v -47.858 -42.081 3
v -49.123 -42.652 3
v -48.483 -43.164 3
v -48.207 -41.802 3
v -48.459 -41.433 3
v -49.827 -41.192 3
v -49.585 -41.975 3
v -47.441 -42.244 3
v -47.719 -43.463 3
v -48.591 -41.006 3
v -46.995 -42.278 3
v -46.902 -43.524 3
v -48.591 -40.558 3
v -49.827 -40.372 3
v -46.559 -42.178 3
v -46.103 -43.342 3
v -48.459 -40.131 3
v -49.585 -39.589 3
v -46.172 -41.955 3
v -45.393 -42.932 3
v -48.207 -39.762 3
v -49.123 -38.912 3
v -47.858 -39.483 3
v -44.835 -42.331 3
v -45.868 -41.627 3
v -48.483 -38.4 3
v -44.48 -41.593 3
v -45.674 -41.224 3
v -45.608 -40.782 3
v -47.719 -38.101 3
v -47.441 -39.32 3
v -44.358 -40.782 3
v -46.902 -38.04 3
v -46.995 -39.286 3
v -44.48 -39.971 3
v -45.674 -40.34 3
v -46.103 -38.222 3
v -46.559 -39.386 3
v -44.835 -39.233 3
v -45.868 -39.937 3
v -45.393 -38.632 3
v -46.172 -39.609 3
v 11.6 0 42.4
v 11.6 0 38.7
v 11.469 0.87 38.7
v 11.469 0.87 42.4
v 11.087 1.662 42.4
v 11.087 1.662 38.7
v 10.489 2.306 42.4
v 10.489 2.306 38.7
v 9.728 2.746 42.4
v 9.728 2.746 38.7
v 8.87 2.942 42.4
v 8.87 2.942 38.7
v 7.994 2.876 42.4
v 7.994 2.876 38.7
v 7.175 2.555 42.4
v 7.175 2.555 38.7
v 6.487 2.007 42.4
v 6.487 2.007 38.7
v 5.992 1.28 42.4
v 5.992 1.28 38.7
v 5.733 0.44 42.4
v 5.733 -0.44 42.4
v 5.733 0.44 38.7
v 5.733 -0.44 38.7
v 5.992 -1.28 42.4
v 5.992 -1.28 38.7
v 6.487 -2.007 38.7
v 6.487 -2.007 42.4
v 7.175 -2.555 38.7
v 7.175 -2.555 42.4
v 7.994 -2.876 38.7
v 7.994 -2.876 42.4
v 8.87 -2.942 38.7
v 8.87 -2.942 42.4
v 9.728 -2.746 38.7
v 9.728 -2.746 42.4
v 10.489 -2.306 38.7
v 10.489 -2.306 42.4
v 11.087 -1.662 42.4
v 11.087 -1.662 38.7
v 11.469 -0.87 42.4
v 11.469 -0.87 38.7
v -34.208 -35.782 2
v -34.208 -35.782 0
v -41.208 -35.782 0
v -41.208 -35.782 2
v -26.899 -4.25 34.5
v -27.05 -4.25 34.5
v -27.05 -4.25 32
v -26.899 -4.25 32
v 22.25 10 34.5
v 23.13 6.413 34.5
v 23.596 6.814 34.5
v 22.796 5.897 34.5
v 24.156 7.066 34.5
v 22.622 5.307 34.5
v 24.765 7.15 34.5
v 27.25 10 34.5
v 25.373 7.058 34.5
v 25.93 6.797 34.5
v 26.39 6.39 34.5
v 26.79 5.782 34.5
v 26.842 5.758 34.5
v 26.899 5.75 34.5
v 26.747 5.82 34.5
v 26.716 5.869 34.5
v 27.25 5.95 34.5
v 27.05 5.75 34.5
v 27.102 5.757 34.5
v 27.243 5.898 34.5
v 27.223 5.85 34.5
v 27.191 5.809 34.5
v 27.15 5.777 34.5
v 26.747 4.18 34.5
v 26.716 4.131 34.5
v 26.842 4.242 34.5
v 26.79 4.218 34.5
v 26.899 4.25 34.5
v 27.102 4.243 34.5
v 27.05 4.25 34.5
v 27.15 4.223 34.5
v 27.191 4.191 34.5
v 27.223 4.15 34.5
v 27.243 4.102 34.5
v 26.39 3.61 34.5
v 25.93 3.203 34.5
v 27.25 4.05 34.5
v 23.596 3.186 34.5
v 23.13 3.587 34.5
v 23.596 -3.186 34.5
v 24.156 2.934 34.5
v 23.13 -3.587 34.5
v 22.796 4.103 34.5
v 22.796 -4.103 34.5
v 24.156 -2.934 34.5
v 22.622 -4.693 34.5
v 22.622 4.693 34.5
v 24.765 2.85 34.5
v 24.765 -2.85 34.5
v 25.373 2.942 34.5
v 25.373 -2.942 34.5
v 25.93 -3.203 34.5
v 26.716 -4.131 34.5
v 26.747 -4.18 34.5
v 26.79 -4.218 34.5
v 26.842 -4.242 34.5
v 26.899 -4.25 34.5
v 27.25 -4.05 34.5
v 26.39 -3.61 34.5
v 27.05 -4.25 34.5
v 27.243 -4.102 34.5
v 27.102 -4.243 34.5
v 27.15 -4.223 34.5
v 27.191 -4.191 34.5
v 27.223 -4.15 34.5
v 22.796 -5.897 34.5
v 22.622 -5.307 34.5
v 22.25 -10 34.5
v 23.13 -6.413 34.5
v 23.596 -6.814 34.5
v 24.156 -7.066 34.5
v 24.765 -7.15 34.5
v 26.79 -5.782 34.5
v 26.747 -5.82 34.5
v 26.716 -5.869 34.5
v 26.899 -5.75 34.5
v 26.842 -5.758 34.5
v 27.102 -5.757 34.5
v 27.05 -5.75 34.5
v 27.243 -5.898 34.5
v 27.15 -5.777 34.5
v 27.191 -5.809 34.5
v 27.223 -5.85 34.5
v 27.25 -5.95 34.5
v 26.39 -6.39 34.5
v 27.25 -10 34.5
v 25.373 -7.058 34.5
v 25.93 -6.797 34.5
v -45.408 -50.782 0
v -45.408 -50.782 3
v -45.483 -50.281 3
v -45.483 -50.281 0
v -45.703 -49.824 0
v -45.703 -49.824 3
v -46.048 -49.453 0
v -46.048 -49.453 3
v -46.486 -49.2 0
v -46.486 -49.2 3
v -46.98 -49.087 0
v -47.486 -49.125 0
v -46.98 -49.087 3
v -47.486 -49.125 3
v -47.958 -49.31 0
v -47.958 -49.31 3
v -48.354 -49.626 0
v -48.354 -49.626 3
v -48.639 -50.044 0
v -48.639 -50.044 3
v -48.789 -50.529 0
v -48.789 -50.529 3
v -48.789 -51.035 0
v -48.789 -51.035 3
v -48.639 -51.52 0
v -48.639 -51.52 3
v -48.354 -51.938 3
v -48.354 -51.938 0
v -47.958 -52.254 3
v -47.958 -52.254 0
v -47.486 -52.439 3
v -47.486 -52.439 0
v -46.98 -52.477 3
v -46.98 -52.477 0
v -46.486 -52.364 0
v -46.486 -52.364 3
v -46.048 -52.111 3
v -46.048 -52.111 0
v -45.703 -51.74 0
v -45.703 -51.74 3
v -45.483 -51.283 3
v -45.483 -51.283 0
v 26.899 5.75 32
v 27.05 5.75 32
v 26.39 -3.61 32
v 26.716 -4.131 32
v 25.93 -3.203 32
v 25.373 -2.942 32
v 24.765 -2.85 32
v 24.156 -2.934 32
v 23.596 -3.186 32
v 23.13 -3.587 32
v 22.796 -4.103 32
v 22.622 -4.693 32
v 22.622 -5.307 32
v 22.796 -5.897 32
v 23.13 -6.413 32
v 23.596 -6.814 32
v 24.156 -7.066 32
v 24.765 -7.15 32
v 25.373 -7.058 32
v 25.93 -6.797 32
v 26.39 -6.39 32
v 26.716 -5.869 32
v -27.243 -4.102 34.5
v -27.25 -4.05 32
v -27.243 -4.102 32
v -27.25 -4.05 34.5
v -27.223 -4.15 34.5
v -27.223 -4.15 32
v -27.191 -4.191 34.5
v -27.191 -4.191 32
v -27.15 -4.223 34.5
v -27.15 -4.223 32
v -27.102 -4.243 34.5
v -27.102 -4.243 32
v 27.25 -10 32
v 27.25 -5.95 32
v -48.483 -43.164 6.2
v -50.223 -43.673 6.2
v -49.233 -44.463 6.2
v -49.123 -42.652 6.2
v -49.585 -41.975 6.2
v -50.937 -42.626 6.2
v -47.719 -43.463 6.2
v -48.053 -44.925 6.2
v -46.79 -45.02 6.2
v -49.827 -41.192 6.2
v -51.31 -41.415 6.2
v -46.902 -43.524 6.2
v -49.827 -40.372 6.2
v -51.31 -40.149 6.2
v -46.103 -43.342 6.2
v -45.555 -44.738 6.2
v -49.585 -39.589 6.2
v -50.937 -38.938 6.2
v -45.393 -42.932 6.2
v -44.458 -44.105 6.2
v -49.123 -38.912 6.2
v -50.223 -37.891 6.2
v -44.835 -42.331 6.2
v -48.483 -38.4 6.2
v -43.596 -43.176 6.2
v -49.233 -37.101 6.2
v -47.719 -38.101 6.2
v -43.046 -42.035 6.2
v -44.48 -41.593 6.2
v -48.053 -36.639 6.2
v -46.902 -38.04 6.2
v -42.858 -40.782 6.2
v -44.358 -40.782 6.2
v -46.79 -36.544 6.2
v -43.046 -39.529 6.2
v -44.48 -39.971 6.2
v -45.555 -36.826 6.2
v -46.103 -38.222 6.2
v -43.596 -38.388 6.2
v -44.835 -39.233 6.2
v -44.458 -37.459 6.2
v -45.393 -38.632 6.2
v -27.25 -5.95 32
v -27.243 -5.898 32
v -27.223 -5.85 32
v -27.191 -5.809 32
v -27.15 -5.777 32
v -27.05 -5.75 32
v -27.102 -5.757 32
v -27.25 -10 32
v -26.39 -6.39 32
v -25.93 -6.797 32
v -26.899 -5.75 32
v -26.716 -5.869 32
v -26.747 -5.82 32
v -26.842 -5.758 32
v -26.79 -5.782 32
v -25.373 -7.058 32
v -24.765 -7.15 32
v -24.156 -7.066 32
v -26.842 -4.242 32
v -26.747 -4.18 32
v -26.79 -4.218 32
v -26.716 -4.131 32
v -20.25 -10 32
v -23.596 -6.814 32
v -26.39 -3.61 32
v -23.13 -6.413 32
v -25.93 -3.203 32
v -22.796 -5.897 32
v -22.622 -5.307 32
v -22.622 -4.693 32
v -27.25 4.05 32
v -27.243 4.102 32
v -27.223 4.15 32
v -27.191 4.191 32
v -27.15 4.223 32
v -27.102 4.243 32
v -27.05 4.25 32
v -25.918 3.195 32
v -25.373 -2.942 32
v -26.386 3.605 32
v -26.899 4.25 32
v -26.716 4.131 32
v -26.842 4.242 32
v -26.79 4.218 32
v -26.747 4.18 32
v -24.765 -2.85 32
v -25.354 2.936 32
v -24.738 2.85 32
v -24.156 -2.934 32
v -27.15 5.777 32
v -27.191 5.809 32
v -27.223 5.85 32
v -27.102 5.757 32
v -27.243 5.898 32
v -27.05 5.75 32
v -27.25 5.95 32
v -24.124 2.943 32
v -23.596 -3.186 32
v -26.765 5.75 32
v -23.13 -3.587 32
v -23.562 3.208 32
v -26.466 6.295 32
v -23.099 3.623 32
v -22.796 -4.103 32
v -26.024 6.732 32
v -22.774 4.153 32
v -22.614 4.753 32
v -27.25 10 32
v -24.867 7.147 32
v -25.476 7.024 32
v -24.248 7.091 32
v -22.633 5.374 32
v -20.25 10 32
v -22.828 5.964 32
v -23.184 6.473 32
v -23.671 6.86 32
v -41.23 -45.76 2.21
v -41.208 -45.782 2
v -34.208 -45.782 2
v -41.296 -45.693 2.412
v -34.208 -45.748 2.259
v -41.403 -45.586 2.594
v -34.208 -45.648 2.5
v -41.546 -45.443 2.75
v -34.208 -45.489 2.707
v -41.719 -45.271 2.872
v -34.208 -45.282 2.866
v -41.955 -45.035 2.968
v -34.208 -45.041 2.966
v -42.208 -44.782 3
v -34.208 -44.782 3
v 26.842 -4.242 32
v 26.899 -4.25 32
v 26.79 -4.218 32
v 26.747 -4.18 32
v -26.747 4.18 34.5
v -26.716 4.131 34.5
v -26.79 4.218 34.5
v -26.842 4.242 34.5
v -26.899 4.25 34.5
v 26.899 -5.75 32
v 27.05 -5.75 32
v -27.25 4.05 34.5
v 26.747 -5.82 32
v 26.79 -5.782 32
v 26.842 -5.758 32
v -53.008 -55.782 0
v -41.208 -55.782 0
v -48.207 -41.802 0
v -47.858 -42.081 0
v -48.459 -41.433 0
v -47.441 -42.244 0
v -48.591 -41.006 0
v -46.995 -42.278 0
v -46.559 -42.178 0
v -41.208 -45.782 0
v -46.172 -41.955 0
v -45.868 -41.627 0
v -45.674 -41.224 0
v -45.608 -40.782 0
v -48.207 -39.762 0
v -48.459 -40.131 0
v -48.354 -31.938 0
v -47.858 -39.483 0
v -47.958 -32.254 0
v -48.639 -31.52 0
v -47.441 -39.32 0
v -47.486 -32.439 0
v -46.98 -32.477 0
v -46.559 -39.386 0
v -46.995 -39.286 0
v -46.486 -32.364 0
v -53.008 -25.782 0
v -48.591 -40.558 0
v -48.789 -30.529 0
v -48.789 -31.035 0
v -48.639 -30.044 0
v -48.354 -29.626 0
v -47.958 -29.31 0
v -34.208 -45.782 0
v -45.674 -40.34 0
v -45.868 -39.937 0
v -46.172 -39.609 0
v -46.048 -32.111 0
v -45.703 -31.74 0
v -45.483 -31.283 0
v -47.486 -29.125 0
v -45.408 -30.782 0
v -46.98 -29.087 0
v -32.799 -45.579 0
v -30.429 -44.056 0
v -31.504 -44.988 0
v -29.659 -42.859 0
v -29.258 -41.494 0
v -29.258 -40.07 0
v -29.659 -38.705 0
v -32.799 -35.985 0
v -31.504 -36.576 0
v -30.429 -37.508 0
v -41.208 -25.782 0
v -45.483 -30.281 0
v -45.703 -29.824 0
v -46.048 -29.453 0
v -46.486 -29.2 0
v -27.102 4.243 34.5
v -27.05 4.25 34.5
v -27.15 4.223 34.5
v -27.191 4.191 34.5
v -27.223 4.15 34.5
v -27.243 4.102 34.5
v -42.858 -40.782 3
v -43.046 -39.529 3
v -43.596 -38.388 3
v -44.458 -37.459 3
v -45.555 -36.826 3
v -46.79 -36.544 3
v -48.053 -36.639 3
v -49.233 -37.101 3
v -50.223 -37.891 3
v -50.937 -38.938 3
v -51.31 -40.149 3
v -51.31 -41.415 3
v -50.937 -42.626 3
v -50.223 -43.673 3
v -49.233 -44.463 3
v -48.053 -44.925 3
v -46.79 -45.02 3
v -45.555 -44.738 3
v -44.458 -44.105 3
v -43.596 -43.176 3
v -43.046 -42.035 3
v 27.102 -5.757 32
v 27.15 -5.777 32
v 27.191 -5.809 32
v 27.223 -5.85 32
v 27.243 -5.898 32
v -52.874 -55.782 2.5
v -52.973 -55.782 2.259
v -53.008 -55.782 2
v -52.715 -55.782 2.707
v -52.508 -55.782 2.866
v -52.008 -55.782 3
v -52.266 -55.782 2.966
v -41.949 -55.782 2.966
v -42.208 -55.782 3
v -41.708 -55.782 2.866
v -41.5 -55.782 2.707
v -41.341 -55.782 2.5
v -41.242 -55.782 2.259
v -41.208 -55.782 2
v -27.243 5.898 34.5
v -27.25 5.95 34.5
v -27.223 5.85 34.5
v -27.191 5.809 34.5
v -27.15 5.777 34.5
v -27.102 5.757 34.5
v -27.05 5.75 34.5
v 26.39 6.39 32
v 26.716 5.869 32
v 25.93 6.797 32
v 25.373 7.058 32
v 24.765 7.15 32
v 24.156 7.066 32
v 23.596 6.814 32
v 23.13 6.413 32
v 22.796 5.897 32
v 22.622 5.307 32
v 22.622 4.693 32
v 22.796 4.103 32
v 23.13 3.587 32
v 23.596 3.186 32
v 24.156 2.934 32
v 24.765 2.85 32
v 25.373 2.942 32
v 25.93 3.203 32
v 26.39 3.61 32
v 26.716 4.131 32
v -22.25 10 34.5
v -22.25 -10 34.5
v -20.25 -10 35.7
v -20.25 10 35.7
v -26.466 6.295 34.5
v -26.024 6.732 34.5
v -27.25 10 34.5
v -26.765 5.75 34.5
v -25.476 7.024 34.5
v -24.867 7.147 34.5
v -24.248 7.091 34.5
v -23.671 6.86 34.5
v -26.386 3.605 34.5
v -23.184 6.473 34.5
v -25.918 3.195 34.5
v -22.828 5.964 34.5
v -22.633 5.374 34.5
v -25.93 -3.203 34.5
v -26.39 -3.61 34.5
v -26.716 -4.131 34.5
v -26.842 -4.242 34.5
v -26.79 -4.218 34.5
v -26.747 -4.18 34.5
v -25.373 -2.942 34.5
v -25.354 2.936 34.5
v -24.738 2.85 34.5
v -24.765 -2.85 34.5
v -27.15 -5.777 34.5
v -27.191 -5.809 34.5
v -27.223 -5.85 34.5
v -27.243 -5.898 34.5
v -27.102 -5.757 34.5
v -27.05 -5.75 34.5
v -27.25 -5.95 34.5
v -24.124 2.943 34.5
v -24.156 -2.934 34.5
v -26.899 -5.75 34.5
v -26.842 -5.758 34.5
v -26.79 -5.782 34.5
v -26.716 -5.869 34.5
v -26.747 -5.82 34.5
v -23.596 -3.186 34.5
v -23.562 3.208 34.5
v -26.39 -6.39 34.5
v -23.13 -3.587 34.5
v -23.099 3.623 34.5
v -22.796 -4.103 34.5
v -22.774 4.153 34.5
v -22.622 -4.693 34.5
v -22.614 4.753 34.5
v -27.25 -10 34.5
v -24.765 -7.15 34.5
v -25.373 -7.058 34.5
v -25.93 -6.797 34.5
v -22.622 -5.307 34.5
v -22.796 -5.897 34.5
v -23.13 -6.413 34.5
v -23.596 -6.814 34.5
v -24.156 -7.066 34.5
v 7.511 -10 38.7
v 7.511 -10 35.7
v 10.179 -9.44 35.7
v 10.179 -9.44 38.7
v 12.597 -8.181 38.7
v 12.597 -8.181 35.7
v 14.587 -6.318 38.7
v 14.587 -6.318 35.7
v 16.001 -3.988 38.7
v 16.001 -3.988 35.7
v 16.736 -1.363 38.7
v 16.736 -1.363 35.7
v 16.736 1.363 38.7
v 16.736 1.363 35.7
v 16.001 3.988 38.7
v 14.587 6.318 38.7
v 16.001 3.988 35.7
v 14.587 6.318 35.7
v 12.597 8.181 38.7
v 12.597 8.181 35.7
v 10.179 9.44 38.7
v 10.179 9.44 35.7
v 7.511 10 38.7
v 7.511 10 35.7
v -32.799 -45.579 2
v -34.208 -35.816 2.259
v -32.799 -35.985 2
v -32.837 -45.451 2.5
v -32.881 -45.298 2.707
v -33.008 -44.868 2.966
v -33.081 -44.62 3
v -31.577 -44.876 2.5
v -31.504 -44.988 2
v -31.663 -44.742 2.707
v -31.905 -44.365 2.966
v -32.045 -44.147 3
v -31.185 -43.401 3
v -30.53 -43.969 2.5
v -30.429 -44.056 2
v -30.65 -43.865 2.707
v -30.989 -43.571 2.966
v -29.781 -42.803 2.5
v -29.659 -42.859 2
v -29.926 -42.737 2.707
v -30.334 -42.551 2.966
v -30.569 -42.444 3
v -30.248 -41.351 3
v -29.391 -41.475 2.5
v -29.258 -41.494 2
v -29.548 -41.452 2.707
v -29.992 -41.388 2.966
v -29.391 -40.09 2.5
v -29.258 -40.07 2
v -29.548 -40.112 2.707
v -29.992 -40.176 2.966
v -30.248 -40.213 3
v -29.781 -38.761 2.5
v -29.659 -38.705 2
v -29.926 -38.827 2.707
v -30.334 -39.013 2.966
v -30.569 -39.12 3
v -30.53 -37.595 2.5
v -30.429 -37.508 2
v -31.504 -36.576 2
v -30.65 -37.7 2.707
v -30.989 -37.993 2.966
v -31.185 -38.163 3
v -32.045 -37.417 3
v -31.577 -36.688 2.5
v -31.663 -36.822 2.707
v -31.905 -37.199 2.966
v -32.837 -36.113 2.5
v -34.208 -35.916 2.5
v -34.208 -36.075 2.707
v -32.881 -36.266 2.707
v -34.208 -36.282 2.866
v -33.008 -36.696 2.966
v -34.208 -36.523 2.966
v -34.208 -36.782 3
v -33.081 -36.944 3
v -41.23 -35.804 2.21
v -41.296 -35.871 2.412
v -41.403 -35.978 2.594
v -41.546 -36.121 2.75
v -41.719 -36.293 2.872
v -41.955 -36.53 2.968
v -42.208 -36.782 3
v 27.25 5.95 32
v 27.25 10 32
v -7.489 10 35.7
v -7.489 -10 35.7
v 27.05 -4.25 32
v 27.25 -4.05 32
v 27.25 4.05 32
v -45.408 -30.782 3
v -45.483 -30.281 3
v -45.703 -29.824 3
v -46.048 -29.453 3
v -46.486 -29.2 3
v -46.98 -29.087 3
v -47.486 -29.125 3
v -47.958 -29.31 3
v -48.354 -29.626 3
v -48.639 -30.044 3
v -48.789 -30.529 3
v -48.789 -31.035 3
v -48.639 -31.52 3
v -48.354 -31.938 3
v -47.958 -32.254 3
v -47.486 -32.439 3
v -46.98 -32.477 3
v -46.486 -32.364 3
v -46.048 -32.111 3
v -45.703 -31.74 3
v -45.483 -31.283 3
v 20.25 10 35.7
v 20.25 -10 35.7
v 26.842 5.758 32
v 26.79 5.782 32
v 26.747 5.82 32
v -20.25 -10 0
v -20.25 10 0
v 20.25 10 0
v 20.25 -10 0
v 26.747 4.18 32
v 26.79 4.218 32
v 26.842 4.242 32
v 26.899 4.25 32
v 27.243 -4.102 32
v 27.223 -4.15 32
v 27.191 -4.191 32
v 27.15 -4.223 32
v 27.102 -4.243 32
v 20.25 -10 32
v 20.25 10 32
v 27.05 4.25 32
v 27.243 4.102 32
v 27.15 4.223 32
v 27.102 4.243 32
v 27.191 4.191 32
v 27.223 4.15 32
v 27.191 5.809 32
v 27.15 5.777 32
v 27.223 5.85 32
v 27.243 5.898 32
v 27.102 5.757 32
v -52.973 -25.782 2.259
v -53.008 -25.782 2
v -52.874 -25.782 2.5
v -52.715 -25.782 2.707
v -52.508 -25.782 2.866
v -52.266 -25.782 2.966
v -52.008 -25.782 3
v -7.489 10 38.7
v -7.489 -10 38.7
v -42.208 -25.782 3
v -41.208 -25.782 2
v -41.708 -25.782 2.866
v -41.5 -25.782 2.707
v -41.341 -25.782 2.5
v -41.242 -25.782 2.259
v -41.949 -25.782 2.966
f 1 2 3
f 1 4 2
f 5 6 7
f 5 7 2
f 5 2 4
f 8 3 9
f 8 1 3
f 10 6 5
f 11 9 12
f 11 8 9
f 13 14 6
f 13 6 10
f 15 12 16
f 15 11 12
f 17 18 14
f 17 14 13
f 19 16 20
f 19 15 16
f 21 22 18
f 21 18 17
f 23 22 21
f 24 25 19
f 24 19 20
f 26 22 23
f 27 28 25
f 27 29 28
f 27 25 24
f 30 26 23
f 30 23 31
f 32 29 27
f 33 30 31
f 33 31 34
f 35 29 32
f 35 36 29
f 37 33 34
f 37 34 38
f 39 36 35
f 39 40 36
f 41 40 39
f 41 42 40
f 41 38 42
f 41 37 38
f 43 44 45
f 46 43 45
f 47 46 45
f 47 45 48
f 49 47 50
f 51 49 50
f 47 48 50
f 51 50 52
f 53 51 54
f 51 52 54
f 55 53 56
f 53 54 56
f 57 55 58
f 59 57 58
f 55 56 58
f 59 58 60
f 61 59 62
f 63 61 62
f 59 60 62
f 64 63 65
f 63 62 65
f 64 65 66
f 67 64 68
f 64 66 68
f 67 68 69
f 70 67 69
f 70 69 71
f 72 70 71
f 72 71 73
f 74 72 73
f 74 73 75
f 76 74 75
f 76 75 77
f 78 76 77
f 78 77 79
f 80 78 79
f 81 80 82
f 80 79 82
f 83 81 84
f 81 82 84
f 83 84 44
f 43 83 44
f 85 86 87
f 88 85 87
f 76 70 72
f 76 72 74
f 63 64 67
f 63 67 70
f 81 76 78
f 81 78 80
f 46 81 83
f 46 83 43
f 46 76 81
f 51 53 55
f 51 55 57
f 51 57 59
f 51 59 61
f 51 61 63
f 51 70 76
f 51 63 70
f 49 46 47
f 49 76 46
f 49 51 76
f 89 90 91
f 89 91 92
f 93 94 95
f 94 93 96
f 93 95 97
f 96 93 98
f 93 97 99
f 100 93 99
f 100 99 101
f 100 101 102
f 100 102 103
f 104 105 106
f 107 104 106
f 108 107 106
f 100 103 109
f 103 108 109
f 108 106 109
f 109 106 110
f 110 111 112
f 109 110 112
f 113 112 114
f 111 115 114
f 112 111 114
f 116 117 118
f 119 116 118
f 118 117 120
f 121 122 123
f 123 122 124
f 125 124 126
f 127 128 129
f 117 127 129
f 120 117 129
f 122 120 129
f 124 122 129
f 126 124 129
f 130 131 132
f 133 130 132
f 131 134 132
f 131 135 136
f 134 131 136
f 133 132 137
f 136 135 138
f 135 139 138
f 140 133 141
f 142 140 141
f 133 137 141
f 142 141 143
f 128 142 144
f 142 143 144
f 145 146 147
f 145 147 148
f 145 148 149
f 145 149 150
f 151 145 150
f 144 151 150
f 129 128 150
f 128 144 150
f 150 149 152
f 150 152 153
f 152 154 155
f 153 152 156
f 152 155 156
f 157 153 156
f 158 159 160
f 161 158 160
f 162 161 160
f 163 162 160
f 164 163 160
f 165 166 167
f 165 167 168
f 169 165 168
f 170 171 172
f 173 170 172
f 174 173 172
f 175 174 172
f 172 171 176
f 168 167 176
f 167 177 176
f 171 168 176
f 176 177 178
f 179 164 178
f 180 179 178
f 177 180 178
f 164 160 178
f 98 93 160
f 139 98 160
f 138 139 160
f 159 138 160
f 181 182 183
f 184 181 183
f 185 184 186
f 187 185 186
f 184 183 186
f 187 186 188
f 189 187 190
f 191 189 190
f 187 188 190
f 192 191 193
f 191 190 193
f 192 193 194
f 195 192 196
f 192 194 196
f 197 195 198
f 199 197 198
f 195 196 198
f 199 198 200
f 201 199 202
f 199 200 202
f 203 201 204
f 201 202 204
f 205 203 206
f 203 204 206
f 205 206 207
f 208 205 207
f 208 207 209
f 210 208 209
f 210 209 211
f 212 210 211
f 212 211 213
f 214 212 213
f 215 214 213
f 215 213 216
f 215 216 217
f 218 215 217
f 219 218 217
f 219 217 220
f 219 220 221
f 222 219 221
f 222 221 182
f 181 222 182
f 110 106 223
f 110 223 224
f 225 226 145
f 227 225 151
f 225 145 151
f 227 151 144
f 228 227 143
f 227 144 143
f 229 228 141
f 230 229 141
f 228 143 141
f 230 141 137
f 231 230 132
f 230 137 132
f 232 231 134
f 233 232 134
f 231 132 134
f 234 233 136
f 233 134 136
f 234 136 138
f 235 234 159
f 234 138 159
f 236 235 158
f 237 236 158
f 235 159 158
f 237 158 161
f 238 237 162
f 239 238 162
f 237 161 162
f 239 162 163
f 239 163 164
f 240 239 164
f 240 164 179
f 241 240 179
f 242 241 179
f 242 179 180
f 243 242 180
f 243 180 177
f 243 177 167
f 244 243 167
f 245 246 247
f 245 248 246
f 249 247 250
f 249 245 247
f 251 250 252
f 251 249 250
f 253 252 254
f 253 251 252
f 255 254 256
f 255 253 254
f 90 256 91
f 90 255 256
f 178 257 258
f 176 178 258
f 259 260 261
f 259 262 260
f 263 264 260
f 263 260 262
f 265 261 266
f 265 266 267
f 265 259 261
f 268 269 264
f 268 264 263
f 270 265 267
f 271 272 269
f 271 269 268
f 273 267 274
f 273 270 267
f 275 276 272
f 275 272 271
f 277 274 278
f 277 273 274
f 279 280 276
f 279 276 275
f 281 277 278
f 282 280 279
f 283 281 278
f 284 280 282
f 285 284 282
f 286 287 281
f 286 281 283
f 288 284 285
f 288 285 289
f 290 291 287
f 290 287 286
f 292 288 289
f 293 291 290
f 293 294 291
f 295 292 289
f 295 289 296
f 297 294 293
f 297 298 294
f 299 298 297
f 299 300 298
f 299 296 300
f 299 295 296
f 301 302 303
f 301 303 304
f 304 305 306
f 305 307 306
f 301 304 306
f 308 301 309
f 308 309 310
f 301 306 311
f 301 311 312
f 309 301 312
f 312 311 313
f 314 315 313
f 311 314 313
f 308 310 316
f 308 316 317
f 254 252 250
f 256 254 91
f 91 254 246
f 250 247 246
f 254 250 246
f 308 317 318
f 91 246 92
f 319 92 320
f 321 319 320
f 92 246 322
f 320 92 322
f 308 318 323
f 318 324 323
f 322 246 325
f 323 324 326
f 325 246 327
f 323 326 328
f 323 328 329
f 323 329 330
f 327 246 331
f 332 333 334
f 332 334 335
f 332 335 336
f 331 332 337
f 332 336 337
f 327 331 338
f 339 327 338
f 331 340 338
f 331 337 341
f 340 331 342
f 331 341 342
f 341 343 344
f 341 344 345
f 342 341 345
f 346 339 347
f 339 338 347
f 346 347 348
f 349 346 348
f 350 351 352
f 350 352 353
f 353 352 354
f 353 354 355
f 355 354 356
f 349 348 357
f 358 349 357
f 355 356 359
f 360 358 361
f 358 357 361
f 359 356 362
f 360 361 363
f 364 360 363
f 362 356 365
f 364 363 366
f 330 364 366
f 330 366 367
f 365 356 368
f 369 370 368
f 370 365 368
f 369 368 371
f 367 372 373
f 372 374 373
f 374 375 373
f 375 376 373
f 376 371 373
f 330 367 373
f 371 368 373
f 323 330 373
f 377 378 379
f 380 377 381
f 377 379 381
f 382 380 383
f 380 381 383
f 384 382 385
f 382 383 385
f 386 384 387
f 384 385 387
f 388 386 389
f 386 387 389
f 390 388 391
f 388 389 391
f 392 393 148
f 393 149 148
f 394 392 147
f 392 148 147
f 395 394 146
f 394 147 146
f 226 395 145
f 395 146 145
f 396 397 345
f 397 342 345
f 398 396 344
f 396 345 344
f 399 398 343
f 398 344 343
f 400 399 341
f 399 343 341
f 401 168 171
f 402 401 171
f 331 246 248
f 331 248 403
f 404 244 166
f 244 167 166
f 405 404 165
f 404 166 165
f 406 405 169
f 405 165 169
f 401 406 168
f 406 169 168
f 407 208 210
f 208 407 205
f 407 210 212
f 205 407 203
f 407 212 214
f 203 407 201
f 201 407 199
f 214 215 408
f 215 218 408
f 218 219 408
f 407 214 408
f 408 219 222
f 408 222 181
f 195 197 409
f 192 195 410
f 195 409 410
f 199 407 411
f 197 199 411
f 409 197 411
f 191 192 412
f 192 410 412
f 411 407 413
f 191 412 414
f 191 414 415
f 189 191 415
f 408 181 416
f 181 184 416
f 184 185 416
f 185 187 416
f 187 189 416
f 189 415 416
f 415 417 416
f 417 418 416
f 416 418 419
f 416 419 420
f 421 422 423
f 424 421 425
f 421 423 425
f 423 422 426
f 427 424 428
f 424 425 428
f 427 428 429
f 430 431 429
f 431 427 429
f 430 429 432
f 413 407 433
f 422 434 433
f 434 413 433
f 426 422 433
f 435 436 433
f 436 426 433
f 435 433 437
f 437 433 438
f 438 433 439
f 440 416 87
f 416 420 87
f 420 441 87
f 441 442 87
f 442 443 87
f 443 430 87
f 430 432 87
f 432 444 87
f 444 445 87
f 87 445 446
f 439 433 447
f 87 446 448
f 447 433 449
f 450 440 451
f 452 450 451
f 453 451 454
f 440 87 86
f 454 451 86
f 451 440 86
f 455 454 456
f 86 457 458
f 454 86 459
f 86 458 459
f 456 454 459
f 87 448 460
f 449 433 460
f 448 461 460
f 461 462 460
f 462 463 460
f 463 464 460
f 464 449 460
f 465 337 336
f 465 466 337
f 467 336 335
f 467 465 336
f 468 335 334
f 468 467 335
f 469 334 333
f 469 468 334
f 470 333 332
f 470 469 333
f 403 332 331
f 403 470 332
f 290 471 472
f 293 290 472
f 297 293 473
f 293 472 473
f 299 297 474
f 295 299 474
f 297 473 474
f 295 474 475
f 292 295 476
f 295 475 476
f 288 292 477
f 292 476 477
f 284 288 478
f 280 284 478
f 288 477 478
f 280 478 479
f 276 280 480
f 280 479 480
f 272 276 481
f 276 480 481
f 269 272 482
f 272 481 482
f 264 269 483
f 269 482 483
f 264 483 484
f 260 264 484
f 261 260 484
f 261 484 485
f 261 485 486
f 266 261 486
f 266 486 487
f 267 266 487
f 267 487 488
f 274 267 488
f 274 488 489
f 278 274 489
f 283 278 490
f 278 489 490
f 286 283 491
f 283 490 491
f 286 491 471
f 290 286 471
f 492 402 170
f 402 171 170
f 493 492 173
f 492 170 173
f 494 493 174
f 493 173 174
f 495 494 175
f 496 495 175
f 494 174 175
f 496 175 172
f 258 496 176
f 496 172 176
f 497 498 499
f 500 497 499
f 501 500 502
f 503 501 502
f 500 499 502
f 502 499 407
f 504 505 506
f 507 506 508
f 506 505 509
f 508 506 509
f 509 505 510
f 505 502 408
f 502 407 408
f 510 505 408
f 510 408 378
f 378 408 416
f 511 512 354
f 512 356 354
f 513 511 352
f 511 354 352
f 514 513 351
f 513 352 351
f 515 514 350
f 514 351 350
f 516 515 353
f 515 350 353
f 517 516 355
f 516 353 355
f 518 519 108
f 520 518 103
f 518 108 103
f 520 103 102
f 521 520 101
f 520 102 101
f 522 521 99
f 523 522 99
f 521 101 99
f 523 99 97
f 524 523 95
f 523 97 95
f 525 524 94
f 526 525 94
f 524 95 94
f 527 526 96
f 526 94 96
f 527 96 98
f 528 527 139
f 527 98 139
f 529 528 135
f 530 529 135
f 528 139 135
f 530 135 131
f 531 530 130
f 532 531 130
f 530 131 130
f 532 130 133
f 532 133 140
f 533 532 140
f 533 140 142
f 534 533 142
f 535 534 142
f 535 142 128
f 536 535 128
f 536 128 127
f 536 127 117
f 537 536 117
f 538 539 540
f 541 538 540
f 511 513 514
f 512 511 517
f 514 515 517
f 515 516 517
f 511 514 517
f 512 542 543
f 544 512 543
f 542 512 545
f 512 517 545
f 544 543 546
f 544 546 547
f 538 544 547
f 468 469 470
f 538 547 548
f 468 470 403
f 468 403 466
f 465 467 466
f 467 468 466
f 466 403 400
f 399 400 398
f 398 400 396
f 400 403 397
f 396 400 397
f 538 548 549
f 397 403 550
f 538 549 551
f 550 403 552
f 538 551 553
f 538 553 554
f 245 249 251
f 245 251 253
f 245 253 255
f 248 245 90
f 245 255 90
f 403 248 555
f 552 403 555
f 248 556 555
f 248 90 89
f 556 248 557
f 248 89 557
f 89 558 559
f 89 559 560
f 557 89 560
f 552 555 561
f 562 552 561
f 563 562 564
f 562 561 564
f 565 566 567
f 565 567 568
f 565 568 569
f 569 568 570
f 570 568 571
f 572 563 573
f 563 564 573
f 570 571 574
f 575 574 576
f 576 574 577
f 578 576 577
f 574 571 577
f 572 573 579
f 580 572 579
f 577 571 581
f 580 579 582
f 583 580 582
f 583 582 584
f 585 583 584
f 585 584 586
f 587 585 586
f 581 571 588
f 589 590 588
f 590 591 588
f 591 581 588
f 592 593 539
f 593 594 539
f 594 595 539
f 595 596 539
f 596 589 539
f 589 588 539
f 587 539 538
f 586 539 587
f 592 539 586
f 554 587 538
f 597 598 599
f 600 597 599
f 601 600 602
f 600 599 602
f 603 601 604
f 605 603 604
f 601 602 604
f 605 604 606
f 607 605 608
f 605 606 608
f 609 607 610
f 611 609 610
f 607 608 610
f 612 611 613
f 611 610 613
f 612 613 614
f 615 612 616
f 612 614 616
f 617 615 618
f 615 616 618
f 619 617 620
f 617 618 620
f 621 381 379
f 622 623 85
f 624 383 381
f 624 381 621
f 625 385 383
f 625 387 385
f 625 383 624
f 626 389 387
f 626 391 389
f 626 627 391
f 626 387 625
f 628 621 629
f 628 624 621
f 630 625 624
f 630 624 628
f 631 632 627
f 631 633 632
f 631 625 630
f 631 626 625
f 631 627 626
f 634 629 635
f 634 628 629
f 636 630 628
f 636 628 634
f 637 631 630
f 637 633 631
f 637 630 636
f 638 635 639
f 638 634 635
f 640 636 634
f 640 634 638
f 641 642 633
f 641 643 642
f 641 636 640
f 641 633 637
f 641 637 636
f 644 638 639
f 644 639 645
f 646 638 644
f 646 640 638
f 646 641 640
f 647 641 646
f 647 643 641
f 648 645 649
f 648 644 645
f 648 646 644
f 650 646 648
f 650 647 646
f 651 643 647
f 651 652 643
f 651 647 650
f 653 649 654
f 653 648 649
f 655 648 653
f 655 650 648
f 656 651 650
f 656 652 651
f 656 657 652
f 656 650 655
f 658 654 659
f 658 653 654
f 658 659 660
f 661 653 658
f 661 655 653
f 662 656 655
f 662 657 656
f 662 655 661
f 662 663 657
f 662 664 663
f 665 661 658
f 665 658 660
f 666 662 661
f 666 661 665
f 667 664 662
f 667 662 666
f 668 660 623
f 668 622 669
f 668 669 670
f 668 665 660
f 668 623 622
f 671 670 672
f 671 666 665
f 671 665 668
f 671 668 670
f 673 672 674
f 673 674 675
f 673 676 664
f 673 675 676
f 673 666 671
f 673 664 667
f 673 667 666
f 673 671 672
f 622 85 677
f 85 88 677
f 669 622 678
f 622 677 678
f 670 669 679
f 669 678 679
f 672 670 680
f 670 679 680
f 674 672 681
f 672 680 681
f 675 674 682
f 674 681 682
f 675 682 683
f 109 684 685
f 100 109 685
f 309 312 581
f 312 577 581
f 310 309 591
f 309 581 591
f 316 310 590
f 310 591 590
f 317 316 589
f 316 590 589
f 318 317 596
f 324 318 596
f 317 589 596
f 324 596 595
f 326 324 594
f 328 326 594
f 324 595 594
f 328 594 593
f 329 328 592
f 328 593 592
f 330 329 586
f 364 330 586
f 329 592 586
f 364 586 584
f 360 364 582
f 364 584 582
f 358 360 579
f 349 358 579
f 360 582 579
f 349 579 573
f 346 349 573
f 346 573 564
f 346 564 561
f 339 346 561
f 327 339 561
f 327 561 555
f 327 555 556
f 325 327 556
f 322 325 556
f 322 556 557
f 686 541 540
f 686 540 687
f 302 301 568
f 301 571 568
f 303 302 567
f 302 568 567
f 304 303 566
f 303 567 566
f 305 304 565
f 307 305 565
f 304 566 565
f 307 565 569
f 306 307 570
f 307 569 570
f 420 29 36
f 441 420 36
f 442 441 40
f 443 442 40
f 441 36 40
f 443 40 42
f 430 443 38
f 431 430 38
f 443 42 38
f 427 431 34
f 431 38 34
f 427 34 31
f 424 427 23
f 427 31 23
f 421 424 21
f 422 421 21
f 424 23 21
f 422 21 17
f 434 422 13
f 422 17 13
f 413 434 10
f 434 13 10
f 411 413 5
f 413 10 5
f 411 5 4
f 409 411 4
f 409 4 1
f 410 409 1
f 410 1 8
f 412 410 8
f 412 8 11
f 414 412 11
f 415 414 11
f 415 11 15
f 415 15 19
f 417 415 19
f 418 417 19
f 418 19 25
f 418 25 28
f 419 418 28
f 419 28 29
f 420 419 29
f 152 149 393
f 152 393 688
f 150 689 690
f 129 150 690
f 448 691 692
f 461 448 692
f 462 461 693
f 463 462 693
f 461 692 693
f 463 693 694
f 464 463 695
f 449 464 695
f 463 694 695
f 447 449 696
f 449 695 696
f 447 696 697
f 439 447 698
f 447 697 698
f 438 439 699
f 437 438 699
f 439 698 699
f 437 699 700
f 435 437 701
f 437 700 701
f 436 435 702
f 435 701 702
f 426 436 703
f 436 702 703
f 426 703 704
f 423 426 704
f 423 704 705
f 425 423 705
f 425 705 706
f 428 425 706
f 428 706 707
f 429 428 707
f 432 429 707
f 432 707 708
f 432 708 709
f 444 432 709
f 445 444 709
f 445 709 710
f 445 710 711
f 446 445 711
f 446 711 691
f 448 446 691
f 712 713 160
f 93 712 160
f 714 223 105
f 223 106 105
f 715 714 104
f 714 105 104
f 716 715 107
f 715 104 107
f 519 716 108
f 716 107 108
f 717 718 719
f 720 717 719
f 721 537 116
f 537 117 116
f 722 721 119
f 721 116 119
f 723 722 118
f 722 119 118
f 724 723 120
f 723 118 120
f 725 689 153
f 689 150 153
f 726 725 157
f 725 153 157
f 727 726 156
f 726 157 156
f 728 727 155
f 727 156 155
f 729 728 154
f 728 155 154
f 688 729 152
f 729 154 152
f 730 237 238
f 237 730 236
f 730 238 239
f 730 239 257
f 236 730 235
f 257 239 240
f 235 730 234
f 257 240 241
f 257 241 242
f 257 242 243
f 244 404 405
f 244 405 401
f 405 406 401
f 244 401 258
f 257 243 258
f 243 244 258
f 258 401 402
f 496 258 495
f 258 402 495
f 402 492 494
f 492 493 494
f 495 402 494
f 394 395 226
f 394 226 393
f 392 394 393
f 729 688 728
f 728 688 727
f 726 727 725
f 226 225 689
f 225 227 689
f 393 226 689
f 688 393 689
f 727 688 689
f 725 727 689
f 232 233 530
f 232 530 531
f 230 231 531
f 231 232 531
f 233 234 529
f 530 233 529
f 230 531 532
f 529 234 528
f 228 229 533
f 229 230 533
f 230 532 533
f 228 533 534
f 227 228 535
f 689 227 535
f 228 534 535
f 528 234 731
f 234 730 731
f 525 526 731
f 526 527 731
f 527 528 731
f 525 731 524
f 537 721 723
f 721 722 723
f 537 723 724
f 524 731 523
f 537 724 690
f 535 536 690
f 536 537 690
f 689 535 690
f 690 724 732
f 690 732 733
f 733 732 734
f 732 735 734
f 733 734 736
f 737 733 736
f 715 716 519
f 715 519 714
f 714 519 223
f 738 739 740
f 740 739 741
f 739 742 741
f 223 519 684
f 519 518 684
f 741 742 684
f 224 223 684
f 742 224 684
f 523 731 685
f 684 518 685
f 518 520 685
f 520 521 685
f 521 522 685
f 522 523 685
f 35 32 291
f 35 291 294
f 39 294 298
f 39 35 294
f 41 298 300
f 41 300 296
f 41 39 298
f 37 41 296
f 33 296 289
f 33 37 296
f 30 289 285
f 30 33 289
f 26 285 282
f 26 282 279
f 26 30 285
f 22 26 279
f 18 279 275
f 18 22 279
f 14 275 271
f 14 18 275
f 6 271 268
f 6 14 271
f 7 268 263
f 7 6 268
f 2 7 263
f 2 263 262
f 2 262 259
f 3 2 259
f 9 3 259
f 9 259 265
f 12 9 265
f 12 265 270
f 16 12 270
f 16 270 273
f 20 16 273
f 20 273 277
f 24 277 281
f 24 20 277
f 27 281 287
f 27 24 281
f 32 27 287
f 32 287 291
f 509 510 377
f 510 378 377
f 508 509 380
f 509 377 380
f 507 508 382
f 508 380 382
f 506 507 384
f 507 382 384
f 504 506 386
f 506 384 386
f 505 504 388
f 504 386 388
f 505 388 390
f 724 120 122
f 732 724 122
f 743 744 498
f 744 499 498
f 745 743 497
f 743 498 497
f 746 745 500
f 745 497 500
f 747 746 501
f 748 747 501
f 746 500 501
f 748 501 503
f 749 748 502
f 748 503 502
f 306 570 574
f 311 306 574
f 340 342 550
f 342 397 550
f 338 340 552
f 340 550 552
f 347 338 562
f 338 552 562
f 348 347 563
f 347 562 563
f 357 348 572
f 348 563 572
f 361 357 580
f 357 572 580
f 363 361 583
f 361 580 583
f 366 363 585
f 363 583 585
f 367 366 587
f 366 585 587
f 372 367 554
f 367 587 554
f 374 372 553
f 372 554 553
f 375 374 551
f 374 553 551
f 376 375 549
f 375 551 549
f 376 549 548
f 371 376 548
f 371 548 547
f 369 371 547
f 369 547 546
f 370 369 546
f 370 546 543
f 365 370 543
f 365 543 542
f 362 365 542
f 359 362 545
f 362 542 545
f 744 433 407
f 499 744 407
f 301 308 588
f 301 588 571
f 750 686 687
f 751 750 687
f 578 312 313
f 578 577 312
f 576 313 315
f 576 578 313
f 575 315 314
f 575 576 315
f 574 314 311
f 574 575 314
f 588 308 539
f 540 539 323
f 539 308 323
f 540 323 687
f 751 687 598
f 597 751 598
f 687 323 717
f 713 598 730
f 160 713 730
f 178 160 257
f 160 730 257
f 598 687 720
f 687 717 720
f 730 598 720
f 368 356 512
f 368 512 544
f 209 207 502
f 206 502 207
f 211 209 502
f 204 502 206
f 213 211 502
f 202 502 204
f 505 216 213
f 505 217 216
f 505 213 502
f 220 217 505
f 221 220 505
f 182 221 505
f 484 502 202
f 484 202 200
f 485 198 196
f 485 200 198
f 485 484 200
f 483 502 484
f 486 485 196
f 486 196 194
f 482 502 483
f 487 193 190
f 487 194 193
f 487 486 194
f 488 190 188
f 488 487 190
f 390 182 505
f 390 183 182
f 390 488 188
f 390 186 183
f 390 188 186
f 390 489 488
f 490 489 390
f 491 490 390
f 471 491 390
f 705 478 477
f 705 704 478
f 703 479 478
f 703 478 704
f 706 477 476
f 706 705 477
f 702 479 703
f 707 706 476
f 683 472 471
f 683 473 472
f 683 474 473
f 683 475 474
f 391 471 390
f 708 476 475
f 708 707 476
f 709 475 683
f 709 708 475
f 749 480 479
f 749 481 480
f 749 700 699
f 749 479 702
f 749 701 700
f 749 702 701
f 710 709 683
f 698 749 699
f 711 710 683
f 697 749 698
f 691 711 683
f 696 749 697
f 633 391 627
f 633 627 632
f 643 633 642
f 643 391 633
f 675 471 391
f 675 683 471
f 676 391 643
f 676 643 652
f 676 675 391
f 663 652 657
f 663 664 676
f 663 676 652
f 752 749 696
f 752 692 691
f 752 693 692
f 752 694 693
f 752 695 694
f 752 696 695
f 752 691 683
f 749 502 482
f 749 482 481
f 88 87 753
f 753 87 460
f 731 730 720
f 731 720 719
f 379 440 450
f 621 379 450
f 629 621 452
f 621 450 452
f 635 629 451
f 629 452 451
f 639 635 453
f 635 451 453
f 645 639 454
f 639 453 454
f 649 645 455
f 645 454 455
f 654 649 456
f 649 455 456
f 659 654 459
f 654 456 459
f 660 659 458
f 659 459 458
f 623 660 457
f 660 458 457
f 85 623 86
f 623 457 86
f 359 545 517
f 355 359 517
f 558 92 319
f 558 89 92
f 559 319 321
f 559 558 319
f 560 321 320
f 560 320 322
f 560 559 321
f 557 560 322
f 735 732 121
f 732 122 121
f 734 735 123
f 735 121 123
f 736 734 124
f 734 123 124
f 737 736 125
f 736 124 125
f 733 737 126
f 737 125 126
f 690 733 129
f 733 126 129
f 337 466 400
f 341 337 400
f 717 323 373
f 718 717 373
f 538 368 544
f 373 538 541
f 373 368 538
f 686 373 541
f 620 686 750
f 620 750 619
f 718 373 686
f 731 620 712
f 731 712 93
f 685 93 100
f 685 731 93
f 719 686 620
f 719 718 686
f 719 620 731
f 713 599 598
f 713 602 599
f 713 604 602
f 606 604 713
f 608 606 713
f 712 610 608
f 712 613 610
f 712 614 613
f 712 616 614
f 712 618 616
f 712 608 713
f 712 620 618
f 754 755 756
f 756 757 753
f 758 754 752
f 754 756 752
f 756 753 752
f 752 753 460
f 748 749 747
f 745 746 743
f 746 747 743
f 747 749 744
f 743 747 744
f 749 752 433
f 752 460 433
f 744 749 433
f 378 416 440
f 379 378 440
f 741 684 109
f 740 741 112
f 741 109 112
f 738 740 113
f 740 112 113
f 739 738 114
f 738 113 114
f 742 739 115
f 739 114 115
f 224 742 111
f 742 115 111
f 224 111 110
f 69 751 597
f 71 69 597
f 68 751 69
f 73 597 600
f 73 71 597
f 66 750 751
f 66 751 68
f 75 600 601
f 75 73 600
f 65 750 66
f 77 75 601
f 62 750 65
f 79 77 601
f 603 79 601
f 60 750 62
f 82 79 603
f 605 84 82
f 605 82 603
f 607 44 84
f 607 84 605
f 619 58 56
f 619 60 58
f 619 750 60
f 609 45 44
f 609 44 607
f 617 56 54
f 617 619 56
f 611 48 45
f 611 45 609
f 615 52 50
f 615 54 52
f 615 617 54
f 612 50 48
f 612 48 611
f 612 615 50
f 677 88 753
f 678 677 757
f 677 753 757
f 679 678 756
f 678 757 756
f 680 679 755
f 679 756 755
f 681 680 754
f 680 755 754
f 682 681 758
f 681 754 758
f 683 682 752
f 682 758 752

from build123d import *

# Parameters (mm, degrees)
F0_W      = 40.5
F0_H      = 20
F1_DEPTH  = 32
F2_W      = 54.5
F2_H      = 20
F3_DEPTH  = 3.7
F5_DEPTH  = 20.001
F6_R      = 2.15
F7_DEPTH  = 34.501
F8_W      = 6
F8_H      = 1.5
F9_DEPTH  = 34.501
F10_R     = 0.2
F11_R     = 0.2
F13_DEPTH = 3
F14_R     = 2.95
F15_DEPTH = 3.7
F17_DEPTH = 3
F18_R     = 1
F19_R     = 4.25
F19_R_2   = 2.75
F20_DEPTH = 3.2
F21_R     = 1.5
F22_DEPTH = 3.001
F23_R     = 1.7
F24_DEPTH = 3.001


with BuildPart() as f1:
    # F0 (on Top) → F1 (new body)
    with BuildSketch(Plane.XY):
        Rectangle(F0_W, F0_H)
    extrude(amount=F1_DEPTH)

    # F2 (on face) → F3 (join)
    with BuildSketch(Plane.XY.offset(32)):
        Rectangle(F2_W, F2_H)
    extrude(amount=F3_DEPTH)

    # F4 (on face) → F5 (cut, through all)
    with BuildSketch(Plane.XZ.offset(10)):
        Polygon((27.25, 35.7), (20.25, 35.7), (22.25, 34.5), (27.25, 34.5), align=None)
        Polygon((-20.25, 35.7), (-27.25, 35.7), (-27.25, 34.5), (-22.25, 34.5), align=None)
    extrude(amount=-F5_DEPTH, mode=Mode.SUBTRACT)

    # F6 (on face) → F7 (cut, through all)
    with BuildSketch(Plane.XY.offset(34.5)):
        with Locations((24.75, 5)):
            Circle(F6_R)
        with Locations((24.75, -5)):
            Circle(F6_R)
        with Locations((-24.75, 5)):
            Circle(F6_R)
        with Locations((-24.75, -5)):
            Circle(F6_R)
    extrude(amount=-F7_DEPTH, mode=Mode.SUBTRACT)

    # F8 (on face) → F9 (cut, through all)
    with BuildSketch(Plane.XY.offset(34.5)):
        with BuildLine():
            Line((-25.3537583657, 5.75), (-25.3537583657, 4.25))
            Line((-25.3537583657, 4.25), (-26.764944168, 4.25))
            ThreePointArc((-26.764944168, 4.25), (-24.3689684797, 2.8840333224), (-22.6, 5))
            ThreePointArc((-22.6, 5), (-24.3689684797, 7.1159666776), (-26.764944168, 5.75))
            Line((-26.764944168, 5.75), (-25.3537583657, 5.75))
        make_face()
        with BuildLine():
            Line((-26.764944168, 4.25), (-25.3537583657, 4.25))
            Line((-25.3537583657, 4.25), (-25.3537583657, 5.75))
            Line((-25.3537583657, 5.75), (-26.764944168, 5.75))
            ThreePointArc((-26.764944168, 5.75), (-26.9, 5), (-26.764944168, 4.25))
        make_face()
        with BuildLine():
            Line((-31.3537583657, 4.25), (-26.764944168, 4.25))
            ThreePointArc((-26.764944168, 4.25), (-26.9, 5), (-26.764944168, 5.75))
            Line((-26.764944168, 5.75), (-31.3537583657, 5.75))
            Line((-31.3537583657, 5.75), (-31.3537583657, 4.25))
        make_face()
        with Locations((-28.3537583657, -5)):
            Rectangle(F8_W, F8_H)
        with Locations((28.3537583657, 5)):
            Rectangle(F8_W, F8_H)
        with Locations((28.3537583657, -5)):
            Rectangle(F8_W, F8_H)
    extrude(amount=-F9_DEPTH, mode=Mode.SUBTRACT)

    # F10
    f10_edges = [f1.edges().sort_by_distance(p)[0] for p in [
        (27.25, 5.75, 33.25),
        (26.764944, 5.75, 33.25),
        (26.764944, 4.25, 33.25),
        (27.25, 4.25, 33.25),
        (27.25, -4.25, 33.25),
        (26.764944, -4.25, 33.25),
        (26.764944, -5.75, 33.25),
        (27.25, -5.75, 33.25),
    ]]
    fillet(f10_edges, radius=F10_R)

    # F11
    f11_edges = [f1.edges().sort_by_distance(p)[0] for p in [
        (-26.764944, 4.25, 33.25),
        (-27.25, 4.25, 33.25),
        (-27.25, -5.75, 33.25),
        (-26.764944, -5.75, 33.25),
        (-27.25, 5.75, 33.25),
        (-27.25, -4.25, 33.25),
        (-26.764944, -4.25, 33.25),
    ]]
    fillet(f11_edges, radius=F11_R)

    # F12 (on face) → F13 (join)
    with BuildSketch(Plane.XY.offset(35.7)):
        with BuildLine():
            ThreePointArc((7.5114076026, -10), (16.8288590177, 0), (7.5114076026, 10))
            Line((7.5114076026, 10), (-7.4885923974, 10))
            Line((-7.4885923974, 10), (-7.4885923974, -10))
            Line((-7.4885923974, -10), (7.5114076026, -10))
        make_face()
    extrude(amount=F13_DEPTH)

    # F14 (on face) → F15 (join)
    with BuildSketch(Plane.XY.offset(38.7)):
        with Locations((8.65, 0)):
            Circle(F14_R)
    extrude(amount=F15_DEPTH)


with BuildPart() as f17:
    # F16 (on Top) → F17 (new body)
    with BuildSketch(Plane.XY):
        with BuildLine():
            Line((-41.2075029179, -25.7820094952), (-53.0075029179, -25.7820094952))
            Line((-53.0075029179, -25.7820094952), (-53.0075029179, -55.7820094952))
            Line((-53.0075029179, -55.7820094952), (-41.2075029179, -55.7820094952))
            Line((-41.2075029179, -55.7820094952), (-41.2075029179, -45.7820094952))
            Line((-41.2075029179, -45.7820094952), (-34.2075029179, -45.7820094952))
            ThreePointArc((-34.2075029179, -45.7820094952), (-29.2075029179, -40.7820094952), (-34.2075029179, -35.7820094952))
            Line((-34.2075029179, -35.7820094952), (-41.2075029179, -35.7820094952))
            Line((-41.2075029179, -35.7820094952), (-41.2075029179, -25.7820094952))
        make_face()
    extrude(amount=F17_DEPTH)

    # F18
    f18_edges = [f17.edges().sort_by_distance(p)[0] for p in [
        (-53.007503, -40.782009, 3),
        (-37.707503, -35.782009, 3),
        (-41.207503, -30.782009, 3),
        (-41.207503, -50.782009, 3),
    ]]
    fillet(f18_edges, radius=F18_R)

    # F19 (on face) → F20 (join)
    with BuildSketch(Plane.XY.offset(3)):
        with Locations((-47.1075029179, -40.7820094952)):
            Circle(F19_R)
        with Locations((-47.1075029179, -40.7820094952)):
            Circle(F19_R_2, mode=Mode.SUBTRACT)
    extrude(amount=F20_DEPTH)

    # F21 (on face) → F22 (cut, through all)
    with BuildSketch(Plane.XY.offset(3)):
        with Locations((-47.1075029179, -40.7820094952)):
            Circle(F21_R)
    extrude(amount=-F22_DEPTH, mode=Mode.SUBTRACT)

    # F23 (on face) → F24 (cut, through all)
    with BuildSketch(Plane.XY.offset(3)):
        with Locations((-47.1075029179, -30.7820094952)):
            Circle(F23_R)
        with Locations((-47.1075029179, -50.7820094952)):
            Circle(F23_R)
    extrude(amount=-F24_DEPTH, mode=Mode.SUBTRACT)


solid = Compound([f1.part, f17.part])
